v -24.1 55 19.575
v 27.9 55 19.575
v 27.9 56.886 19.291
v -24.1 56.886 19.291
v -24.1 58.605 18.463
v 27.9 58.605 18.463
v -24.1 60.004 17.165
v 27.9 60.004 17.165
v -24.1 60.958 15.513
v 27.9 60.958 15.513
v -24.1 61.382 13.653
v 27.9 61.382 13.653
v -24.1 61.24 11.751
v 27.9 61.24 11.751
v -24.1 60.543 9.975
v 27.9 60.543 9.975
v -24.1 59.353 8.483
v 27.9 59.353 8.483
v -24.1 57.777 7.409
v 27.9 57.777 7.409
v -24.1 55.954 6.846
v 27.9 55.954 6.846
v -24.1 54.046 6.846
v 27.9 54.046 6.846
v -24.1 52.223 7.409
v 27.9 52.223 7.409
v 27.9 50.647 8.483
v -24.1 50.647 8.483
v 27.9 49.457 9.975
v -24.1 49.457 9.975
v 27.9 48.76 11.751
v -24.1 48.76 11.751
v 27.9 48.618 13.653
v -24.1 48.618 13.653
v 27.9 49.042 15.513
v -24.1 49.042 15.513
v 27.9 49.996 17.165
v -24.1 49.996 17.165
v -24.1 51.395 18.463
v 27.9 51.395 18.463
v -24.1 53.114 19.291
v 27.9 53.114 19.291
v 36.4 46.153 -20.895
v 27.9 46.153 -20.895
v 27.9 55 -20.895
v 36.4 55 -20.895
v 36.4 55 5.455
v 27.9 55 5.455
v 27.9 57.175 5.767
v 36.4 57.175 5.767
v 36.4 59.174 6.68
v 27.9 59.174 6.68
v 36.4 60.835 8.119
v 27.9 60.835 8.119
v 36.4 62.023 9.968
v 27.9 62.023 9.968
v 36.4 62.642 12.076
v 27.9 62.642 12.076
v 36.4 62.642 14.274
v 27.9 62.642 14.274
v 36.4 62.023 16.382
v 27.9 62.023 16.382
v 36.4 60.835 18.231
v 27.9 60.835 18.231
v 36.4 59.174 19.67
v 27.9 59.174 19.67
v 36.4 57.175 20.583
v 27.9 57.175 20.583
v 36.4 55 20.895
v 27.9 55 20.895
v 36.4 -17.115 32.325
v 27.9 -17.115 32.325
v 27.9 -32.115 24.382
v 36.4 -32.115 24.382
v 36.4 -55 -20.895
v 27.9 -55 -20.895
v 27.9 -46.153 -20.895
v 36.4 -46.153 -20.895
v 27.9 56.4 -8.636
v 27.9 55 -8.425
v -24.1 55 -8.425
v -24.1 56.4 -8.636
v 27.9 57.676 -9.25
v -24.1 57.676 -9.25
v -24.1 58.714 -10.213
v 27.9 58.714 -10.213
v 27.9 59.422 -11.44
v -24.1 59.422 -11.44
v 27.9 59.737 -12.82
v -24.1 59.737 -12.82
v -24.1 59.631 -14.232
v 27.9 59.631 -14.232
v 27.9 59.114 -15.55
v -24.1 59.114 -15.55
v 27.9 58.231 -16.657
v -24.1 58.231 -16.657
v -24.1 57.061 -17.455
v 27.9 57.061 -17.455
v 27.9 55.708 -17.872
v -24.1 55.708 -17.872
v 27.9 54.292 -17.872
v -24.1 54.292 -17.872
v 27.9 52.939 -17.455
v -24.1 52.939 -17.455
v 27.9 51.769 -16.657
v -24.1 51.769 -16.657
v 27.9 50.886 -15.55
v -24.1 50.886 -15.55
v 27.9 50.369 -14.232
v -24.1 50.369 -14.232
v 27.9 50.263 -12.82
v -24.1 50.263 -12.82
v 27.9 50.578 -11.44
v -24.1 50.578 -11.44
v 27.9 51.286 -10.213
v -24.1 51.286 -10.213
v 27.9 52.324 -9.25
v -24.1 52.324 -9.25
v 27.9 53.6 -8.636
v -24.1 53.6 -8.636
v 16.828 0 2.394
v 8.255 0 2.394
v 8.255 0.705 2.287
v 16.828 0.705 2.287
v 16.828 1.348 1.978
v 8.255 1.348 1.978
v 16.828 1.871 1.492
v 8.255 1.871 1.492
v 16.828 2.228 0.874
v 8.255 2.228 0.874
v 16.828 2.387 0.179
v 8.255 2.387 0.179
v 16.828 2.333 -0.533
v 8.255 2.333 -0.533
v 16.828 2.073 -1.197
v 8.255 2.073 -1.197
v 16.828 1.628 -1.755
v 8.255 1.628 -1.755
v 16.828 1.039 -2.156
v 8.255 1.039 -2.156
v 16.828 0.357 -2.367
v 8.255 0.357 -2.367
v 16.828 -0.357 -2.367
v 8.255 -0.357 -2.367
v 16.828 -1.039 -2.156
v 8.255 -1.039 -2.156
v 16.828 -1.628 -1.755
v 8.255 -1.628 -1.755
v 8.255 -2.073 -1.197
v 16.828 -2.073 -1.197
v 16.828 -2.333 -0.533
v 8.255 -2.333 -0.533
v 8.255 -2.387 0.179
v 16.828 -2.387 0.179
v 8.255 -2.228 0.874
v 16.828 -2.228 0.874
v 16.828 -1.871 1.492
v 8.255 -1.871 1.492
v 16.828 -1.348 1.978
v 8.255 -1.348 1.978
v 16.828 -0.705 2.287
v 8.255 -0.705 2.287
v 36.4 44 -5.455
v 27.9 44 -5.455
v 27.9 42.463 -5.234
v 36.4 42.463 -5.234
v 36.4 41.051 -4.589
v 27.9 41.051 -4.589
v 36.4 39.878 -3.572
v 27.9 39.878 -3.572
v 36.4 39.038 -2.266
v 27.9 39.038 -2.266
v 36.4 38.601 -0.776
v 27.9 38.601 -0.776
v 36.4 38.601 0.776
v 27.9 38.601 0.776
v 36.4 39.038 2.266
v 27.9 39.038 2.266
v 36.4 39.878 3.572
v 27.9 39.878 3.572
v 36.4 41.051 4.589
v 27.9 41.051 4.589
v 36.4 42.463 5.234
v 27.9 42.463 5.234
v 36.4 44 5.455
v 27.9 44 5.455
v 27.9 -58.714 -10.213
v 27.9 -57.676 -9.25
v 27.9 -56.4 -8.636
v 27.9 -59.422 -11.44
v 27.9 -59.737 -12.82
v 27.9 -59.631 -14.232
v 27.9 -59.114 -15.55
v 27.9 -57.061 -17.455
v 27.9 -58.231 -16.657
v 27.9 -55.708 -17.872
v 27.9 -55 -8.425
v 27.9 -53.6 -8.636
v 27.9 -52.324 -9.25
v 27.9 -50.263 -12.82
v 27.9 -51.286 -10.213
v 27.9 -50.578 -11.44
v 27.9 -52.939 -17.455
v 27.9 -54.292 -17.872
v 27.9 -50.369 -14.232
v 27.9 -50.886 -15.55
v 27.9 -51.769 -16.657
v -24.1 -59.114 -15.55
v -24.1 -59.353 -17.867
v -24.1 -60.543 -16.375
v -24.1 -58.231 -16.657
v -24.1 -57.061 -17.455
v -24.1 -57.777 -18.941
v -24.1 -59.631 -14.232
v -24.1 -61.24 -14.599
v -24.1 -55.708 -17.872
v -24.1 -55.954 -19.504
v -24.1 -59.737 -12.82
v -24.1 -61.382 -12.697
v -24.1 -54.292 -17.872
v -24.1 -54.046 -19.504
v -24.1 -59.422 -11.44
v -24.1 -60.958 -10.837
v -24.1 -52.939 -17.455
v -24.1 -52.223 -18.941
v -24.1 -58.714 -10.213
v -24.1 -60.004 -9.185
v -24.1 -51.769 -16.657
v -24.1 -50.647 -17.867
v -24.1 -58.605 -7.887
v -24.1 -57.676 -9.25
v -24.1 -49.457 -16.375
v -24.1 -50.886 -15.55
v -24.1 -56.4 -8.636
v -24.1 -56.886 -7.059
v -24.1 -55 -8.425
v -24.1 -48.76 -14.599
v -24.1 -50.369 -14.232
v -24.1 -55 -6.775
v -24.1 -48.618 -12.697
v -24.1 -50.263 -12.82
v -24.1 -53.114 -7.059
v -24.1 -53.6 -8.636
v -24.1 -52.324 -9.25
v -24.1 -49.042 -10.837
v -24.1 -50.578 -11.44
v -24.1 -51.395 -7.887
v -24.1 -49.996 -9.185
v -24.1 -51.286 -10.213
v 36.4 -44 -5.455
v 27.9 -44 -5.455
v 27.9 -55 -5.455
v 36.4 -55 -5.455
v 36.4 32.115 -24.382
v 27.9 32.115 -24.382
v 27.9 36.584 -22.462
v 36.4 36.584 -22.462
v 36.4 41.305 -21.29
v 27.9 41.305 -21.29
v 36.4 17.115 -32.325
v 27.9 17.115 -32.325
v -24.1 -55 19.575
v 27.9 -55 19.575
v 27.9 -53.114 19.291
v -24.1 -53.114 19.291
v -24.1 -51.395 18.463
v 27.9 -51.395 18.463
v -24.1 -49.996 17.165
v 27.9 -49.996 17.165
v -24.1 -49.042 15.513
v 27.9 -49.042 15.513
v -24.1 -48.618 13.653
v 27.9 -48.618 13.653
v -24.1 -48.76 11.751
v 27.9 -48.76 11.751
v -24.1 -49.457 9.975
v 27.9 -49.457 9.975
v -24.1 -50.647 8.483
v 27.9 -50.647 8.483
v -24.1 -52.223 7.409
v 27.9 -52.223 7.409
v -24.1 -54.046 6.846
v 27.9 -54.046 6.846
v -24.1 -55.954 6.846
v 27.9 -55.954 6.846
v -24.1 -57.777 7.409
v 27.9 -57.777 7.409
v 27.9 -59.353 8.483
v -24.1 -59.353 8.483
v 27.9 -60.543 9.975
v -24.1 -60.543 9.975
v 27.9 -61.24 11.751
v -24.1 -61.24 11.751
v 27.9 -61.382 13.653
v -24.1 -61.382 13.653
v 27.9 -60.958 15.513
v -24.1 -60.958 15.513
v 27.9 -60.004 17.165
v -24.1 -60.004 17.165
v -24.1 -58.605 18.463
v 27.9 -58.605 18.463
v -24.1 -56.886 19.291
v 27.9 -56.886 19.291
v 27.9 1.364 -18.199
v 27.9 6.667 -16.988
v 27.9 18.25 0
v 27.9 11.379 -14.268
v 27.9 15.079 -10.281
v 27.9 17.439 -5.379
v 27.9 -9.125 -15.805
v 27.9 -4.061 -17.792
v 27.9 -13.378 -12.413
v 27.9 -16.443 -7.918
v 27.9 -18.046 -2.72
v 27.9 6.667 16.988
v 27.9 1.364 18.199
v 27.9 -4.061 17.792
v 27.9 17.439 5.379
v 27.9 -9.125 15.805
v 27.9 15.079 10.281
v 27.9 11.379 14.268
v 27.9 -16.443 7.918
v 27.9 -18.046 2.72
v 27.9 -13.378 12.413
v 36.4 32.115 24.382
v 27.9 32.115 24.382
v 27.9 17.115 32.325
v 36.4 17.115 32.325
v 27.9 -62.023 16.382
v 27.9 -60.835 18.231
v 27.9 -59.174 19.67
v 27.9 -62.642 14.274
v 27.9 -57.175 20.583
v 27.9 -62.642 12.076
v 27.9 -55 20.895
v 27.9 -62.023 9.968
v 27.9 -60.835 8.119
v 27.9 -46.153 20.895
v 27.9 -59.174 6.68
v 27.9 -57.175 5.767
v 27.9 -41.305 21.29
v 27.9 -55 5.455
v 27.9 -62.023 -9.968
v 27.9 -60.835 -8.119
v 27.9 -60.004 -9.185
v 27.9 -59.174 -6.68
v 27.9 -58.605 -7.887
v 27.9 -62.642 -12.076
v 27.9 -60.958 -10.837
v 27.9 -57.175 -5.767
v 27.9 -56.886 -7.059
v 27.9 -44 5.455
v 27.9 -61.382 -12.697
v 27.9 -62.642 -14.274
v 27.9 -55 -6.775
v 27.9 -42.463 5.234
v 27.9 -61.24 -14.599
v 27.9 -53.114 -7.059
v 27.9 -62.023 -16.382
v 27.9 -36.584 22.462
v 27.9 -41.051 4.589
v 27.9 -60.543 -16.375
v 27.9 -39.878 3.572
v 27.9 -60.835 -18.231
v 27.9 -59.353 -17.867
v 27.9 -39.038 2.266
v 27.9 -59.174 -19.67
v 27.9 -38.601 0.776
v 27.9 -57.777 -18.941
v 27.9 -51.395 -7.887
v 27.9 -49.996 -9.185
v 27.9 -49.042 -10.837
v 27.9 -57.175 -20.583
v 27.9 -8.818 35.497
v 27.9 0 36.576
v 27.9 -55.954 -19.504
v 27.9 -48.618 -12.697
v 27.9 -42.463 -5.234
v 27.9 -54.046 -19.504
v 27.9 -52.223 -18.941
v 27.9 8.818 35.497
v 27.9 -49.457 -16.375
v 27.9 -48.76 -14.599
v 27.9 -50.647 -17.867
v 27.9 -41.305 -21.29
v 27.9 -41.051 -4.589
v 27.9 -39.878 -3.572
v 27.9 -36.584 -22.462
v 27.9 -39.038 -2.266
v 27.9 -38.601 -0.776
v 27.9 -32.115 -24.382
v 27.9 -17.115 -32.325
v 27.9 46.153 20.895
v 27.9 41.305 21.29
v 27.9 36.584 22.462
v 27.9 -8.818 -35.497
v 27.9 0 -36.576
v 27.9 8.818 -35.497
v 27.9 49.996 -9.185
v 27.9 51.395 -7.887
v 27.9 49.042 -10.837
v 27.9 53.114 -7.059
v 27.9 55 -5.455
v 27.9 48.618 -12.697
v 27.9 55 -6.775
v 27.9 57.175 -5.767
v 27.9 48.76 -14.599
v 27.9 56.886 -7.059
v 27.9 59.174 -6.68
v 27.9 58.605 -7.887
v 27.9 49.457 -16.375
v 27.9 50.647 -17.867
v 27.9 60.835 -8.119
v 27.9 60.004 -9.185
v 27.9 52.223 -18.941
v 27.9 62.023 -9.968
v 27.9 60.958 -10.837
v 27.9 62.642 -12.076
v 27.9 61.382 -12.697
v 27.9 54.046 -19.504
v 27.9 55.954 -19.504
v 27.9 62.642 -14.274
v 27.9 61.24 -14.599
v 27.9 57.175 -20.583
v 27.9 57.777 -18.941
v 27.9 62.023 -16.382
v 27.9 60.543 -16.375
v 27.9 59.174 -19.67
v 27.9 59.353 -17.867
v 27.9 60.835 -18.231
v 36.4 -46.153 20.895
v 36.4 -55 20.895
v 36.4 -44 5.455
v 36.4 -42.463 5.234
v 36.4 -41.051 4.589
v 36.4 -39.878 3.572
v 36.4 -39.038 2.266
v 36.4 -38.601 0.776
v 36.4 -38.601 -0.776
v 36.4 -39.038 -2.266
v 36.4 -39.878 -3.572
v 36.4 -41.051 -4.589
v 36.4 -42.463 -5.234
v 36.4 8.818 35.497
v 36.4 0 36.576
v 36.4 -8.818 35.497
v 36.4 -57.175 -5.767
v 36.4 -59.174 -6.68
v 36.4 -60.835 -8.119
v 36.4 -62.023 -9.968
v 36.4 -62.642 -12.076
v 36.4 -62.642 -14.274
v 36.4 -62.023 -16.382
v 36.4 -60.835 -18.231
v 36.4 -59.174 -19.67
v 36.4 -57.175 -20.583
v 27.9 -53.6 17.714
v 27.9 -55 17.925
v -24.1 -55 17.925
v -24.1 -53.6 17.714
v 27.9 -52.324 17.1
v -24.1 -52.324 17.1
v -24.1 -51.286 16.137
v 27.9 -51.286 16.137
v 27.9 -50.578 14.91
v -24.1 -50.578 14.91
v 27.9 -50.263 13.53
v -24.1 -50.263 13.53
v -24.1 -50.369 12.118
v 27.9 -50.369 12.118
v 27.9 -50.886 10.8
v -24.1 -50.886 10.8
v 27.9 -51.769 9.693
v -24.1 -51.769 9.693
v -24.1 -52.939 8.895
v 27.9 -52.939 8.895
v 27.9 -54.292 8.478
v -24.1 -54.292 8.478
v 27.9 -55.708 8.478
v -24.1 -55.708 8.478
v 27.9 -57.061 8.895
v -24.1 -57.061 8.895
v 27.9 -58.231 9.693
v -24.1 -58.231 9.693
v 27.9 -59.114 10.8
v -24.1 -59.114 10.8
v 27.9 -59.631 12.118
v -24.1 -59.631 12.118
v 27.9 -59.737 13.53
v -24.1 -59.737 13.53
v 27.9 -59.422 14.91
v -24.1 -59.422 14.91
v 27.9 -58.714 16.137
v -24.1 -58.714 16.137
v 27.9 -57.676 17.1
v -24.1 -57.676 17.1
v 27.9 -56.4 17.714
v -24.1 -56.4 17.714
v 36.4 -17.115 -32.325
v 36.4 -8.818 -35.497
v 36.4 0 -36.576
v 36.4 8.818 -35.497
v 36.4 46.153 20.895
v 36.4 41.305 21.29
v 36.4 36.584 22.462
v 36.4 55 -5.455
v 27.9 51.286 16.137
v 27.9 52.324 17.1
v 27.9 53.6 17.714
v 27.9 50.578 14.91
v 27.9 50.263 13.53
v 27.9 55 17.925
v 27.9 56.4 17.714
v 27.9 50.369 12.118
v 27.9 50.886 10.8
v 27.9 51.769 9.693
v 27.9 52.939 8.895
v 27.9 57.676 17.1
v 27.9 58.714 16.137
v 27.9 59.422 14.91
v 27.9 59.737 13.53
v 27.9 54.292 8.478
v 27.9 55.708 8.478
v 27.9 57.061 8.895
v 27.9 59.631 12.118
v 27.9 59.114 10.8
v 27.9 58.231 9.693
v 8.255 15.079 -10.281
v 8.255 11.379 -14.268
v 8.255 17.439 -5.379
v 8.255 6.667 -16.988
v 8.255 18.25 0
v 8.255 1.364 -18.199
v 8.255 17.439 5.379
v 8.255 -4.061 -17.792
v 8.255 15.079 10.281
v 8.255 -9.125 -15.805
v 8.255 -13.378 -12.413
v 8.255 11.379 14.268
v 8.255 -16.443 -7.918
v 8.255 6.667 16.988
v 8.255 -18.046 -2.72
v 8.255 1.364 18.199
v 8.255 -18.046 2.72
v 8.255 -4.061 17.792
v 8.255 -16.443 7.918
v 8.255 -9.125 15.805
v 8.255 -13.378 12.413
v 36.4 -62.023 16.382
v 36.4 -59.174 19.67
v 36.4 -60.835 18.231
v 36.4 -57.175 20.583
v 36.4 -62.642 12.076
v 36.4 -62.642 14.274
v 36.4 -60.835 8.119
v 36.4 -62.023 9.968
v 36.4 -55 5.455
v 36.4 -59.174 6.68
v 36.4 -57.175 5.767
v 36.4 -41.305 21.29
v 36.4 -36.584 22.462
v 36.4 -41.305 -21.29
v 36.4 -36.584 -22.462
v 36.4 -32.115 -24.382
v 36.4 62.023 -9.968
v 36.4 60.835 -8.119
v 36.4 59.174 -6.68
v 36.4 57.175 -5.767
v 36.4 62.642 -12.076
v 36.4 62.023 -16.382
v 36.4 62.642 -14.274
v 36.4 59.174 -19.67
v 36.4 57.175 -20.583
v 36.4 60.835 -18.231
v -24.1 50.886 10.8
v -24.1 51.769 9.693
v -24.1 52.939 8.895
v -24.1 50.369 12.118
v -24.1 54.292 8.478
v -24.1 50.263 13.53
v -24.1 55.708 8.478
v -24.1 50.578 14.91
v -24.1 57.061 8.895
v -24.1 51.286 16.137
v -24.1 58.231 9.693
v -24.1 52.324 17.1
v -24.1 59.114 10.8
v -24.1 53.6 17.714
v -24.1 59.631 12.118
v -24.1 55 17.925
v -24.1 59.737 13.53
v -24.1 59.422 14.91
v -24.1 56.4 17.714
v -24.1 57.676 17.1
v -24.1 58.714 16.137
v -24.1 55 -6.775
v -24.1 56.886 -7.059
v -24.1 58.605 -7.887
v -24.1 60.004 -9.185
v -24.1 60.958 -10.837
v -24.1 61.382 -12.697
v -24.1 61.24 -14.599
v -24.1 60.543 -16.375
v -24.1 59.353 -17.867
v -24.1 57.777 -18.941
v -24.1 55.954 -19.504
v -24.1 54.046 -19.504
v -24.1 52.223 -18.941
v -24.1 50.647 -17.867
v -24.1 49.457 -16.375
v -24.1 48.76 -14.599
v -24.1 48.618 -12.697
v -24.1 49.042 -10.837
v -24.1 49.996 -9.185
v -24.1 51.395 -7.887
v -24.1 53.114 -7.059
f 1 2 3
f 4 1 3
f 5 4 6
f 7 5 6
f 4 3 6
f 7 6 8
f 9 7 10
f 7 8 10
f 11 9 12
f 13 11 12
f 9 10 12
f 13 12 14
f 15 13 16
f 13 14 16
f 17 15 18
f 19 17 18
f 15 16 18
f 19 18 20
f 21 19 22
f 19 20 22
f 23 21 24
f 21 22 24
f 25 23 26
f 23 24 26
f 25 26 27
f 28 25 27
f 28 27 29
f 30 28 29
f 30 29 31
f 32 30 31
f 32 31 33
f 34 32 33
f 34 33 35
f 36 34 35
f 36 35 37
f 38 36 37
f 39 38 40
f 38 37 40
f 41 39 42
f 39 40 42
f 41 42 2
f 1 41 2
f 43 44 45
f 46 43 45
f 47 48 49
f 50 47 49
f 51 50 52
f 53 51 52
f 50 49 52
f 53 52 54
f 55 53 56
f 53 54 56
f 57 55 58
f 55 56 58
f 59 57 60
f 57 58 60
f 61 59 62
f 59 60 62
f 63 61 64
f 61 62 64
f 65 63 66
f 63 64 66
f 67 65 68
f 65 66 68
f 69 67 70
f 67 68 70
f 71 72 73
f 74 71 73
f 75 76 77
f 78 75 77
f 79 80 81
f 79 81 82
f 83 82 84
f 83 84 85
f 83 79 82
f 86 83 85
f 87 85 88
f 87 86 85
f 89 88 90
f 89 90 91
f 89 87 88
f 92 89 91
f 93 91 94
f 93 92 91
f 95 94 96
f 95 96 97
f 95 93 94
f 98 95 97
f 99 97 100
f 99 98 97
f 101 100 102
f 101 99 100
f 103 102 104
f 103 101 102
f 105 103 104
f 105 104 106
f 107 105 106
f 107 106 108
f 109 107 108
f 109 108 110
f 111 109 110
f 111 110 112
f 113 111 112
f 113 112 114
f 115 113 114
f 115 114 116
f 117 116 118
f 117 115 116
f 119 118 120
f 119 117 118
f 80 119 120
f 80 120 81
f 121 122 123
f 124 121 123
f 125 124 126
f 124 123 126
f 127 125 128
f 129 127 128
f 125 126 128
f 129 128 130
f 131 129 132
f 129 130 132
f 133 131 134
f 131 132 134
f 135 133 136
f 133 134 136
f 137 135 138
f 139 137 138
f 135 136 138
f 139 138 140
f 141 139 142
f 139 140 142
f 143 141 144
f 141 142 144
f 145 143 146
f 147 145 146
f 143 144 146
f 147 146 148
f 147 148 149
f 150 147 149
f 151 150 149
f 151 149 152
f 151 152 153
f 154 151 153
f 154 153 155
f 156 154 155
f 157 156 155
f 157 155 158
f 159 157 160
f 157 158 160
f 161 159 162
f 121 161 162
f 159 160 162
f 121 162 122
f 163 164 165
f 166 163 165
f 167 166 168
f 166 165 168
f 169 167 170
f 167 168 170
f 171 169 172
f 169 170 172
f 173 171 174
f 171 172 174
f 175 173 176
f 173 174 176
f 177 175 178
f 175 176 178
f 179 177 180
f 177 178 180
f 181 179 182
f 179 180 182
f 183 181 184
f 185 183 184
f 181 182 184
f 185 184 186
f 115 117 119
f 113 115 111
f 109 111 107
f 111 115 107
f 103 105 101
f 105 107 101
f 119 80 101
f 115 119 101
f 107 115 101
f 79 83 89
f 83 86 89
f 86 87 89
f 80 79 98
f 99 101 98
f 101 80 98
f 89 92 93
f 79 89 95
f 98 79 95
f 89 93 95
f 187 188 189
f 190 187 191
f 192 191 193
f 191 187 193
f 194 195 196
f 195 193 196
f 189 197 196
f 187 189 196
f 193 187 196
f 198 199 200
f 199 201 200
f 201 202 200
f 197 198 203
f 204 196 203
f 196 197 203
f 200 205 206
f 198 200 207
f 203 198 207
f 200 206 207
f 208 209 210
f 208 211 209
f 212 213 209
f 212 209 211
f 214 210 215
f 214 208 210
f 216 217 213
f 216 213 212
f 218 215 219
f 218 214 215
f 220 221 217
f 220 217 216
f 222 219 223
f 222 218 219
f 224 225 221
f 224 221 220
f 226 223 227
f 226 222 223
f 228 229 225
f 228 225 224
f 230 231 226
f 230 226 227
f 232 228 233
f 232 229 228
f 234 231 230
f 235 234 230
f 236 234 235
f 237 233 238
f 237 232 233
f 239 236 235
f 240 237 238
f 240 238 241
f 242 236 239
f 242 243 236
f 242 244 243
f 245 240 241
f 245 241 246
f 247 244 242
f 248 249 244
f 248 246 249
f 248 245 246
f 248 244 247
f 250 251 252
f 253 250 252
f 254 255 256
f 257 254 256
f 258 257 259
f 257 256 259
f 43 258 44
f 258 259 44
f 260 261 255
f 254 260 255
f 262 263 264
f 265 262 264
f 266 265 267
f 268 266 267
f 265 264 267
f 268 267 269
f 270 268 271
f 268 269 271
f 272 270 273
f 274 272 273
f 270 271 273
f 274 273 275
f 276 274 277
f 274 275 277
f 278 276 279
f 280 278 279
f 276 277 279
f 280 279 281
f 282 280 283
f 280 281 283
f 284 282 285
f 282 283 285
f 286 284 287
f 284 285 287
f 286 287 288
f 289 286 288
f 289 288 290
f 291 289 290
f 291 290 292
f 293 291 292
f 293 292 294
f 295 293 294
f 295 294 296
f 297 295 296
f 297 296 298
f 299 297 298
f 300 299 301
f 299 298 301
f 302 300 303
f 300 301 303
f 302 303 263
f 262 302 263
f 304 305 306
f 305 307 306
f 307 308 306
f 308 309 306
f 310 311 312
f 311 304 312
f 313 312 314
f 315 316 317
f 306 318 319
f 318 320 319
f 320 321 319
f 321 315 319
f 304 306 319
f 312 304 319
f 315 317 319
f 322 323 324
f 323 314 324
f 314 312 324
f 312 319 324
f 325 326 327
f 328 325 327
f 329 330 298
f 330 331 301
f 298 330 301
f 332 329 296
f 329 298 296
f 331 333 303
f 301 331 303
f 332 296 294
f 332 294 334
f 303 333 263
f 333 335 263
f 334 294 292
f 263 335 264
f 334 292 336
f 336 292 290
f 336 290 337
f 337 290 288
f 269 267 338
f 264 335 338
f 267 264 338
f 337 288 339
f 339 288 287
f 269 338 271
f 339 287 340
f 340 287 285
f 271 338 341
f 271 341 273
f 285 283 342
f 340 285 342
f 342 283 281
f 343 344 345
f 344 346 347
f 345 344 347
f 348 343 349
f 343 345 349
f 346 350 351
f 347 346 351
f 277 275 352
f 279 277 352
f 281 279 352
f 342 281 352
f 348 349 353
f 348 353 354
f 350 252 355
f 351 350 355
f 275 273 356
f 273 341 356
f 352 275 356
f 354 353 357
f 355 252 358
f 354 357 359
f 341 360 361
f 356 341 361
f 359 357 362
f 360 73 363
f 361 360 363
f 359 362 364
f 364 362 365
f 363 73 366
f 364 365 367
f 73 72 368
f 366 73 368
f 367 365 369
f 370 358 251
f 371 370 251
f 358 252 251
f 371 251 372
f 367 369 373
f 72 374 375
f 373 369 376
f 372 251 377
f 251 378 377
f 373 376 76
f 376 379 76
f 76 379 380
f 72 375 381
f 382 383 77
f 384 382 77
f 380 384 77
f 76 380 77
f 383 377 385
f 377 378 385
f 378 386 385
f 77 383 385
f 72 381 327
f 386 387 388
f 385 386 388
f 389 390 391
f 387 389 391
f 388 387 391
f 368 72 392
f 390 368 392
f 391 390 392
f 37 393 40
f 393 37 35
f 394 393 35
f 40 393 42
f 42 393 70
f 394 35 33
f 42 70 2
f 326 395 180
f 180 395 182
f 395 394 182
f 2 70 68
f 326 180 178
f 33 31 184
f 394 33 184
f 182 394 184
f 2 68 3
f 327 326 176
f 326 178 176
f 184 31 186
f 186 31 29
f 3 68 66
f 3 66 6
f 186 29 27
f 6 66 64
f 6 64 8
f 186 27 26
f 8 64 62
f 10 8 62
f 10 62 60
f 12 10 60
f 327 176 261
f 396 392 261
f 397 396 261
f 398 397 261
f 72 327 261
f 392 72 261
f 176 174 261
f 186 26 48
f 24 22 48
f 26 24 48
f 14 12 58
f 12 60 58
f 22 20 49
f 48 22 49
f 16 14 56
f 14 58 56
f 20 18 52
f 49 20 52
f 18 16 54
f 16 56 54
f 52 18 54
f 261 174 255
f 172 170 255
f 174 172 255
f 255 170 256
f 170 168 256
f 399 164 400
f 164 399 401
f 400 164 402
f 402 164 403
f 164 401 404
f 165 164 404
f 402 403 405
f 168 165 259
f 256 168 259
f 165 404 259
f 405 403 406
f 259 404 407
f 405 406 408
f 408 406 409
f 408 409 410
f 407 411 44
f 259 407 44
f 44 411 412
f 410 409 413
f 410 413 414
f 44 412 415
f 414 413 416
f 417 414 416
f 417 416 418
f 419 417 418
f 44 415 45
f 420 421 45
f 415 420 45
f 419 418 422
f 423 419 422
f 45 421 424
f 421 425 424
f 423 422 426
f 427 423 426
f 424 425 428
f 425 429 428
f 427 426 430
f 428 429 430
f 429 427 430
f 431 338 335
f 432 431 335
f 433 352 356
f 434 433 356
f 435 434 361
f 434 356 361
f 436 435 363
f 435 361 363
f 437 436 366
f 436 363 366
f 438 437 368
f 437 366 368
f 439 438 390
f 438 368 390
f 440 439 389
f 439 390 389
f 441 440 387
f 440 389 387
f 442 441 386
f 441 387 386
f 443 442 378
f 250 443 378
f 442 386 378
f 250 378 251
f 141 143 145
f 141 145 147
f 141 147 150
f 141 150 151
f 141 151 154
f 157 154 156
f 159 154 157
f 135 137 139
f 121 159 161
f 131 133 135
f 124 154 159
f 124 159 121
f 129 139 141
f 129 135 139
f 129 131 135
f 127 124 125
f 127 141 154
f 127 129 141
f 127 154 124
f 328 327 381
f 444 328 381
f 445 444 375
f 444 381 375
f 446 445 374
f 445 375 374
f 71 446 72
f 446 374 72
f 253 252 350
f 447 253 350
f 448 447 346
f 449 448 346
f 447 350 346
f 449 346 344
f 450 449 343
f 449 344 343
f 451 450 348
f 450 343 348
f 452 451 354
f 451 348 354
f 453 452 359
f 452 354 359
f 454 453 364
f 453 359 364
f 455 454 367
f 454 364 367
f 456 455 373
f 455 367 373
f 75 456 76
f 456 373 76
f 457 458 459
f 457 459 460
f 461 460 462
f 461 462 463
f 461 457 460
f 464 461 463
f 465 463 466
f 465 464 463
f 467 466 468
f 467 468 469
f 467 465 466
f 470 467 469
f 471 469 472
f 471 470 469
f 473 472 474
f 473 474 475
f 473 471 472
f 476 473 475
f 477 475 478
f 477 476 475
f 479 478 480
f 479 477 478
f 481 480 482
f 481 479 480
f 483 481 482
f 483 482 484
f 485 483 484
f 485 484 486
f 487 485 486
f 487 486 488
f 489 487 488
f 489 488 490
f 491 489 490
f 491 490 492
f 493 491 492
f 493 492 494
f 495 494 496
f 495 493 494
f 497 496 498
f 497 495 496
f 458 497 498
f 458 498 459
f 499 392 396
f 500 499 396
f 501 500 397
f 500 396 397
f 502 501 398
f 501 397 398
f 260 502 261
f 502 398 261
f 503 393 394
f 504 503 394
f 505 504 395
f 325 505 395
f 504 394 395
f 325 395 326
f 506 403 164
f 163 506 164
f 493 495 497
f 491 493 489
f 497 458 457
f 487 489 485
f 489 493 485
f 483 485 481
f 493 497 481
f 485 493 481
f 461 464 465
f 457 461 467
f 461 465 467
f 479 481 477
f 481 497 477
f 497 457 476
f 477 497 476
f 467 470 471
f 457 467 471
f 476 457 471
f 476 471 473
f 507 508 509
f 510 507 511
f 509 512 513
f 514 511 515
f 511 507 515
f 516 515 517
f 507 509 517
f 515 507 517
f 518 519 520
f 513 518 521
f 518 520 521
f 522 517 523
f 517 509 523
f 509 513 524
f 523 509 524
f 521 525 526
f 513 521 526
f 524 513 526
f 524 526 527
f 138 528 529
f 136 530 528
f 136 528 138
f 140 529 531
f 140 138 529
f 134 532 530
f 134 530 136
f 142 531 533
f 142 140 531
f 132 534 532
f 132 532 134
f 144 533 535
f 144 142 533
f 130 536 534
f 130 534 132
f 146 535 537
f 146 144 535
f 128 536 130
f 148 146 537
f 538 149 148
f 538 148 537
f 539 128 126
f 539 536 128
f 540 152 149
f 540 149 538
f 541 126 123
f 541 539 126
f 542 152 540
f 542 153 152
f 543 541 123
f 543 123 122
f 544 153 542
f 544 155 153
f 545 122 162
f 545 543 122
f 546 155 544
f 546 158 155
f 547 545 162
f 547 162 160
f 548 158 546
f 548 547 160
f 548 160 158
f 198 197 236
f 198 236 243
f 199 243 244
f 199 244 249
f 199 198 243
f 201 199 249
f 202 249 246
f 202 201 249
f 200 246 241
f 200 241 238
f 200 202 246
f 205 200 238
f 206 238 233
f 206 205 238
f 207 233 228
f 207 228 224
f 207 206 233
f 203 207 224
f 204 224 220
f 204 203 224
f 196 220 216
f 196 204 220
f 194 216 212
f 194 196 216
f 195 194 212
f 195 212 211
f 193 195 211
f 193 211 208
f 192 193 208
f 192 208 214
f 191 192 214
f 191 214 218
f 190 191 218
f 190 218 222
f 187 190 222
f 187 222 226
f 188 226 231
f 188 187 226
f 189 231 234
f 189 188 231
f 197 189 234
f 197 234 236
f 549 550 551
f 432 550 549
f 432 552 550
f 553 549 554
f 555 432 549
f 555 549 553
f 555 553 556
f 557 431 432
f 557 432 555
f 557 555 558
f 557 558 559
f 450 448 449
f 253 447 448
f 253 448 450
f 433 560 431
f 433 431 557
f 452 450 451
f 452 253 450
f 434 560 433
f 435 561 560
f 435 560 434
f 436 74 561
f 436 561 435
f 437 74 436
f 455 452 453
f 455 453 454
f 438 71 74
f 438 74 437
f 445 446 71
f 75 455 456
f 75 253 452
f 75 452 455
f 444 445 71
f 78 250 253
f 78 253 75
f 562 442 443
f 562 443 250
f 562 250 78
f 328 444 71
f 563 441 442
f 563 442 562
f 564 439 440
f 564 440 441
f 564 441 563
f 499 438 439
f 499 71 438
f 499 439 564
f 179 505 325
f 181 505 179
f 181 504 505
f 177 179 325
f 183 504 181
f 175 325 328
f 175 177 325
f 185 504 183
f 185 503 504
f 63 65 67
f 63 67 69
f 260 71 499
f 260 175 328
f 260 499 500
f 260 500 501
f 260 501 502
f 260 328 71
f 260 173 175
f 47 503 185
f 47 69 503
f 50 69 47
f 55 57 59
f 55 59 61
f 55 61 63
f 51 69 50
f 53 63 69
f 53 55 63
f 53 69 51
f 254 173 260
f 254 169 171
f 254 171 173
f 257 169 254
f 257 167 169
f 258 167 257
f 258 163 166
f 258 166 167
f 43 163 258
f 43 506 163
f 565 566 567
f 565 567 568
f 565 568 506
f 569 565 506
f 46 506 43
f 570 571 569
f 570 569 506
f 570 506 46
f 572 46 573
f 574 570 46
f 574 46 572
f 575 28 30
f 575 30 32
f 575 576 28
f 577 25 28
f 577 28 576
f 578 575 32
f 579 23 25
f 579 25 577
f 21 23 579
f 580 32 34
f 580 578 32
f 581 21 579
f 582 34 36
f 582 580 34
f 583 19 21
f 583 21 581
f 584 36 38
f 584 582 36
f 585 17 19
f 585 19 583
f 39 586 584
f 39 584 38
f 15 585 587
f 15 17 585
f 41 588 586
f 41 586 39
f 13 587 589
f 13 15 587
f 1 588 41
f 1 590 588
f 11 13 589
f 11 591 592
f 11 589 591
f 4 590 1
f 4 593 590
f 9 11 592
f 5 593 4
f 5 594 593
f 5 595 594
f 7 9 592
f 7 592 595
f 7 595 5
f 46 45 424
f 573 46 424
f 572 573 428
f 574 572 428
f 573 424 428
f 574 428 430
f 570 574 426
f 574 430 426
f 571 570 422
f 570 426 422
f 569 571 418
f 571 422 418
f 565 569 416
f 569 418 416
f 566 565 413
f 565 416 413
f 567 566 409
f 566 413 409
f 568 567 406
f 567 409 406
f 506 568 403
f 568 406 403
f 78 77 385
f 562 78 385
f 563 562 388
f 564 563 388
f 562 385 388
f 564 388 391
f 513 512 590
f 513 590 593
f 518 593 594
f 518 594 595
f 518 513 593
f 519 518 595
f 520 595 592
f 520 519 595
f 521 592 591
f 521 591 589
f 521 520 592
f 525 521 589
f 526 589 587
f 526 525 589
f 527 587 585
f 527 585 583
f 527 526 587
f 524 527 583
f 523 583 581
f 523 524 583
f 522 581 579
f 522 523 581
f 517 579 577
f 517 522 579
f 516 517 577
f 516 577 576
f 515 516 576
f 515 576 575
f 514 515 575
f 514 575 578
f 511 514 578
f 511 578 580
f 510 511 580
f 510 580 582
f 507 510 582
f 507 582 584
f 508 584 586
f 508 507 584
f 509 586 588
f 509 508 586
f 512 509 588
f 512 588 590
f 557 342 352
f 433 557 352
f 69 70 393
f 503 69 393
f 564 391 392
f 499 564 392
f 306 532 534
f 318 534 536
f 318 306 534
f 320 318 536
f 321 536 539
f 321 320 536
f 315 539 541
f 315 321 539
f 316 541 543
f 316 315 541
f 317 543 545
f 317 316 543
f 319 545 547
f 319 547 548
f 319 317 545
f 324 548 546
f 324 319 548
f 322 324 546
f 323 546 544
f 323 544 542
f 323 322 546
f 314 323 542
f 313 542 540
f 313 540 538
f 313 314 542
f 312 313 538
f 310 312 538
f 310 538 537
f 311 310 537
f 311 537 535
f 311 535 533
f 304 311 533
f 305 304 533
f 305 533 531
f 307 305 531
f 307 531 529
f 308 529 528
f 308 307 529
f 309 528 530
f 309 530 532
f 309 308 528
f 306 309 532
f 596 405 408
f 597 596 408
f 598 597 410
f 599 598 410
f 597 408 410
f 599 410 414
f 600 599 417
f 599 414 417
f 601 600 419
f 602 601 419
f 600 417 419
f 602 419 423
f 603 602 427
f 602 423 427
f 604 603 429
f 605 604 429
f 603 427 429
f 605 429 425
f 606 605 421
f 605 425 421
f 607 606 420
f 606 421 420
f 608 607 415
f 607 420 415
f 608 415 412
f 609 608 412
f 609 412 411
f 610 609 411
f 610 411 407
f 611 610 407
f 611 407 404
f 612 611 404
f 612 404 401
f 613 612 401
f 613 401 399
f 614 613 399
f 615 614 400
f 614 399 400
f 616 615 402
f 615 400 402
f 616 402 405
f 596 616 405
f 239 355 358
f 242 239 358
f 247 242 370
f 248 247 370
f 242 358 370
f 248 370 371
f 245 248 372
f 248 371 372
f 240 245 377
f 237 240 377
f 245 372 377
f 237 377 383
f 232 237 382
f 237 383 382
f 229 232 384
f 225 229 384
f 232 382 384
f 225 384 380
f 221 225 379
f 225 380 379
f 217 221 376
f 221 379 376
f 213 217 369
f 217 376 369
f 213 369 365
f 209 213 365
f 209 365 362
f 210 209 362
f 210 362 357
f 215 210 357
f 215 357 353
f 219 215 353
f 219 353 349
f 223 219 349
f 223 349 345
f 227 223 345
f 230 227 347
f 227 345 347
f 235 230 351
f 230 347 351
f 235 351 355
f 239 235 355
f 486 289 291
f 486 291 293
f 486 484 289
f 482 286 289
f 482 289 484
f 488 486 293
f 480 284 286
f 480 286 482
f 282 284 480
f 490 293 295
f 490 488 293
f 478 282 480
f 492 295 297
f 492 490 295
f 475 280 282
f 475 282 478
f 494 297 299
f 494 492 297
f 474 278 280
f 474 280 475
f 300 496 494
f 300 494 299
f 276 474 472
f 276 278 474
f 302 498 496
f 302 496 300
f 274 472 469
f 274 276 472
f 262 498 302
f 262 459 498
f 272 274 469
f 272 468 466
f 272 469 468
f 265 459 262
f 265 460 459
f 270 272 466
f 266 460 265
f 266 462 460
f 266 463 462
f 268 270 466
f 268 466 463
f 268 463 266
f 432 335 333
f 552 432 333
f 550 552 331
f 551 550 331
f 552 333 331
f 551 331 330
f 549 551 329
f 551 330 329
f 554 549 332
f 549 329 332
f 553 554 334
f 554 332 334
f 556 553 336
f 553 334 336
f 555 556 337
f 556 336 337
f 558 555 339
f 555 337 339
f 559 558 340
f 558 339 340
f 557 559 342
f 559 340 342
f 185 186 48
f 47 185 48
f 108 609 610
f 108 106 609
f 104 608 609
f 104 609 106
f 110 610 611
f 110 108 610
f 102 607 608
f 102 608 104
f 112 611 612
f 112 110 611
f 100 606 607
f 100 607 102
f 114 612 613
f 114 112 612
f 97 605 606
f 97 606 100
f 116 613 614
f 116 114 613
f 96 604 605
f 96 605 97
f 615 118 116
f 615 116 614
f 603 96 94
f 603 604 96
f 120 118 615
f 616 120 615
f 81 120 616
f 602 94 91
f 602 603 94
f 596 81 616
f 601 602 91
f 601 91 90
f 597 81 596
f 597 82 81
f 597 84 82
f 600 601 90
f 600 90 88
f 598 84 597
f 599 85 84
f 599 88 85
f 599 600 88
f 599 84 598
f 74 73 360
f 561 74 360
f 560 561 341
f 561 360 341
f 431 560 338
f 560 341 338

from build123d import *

# Parameters (mm, degrees)
SKETCH1_W           = 19.645
SKETCH1_H           = 18.25
SKETCH2_R           = 2.3935
CUT_EXTRUDE1_DEPTH  = 8.5725
SKETCH3_R           = 18.25
BOSS_EXTRUDE1_DEPTH = 8.5
SKETCH4_R           = 6.4
SKETCH4_R_2         = 4.75
BOSS_EXTRUDE2_DEPTH = 52


with BuildPart() as part:
    # Sketch1 → Revolve1 (revolve)
    with BuildSketch(Plane.XY):
        with Locations((18.0775, 9.125)):
            Rectangle(SKETCH1_W, SKETCH1_H)
    revolve(axis=Axis((8.255, 0, 0), (1, 0, 0)))

    # Sketch2 → Cut-Extrude1 (cut)
    with BuildSketch(Plane.ZY.offset(-8.255)):
        Circle(SKETCH2_R)
    extrude(amount=-CUT_EXTRUDE1_DEPTH, mode=Mode.SUBTRACT)


with BuildPart() as body_2:
    # Sketch3 → Boss-Extrude1 (new body)
    with BuildSketch(Plane(origin=(27.9, 0, 0), x_dir=(0, 0, -1), z_dir=(1, 0, 0))):
        with BuildLine():
            Line((-24.382347836, 32.115154563), (-32.324530318, 17.115154563))
            ThreePointArc((-32.324530318, 17.115154563), (-36.576, 0), (-32.324530318, -17.115154563))
            Line((-32.324530318, -17.115154563), (-24.382347836, -32.115154563))
            ThreePointArc((-24.382347836, -32.115154563), (-21.780072988, -38.920854003), (-20.89525, -46.153175037))
            Line((-20.89525, -46.153175037), (-20.89525, -55))
            ThreePointArc((-20.89525, -55), (-13.175, -62.72025), (-5.45475, -55))
            Line((-5.45475, -55), (-5.45475, -44))
            ThreePointArc((-5.45475, -44), (0, -38.54525), (5.45475, -44))
            Line((5.45475, -44), (5.45475, -55))
            ThreePointArc((5.45475, -55), (13.175, -62.72025), (20.89525, -55))
            Line((20.89525, -55), (20.89525, -46.153175037))
            ThreePointArc((20.89525, -46.153175037), (21.780072988, -38.920854003), (24.382347836, -32.115154563))
            Line((24.382347836, -32.115154563), (32.324530318, -17.115154563))
            ThreePointArc((32.324530318, -17.115154563), (36.576, 0), (32.324530318, 17.115154563))
            Line((32.324530318, 17.115154563), (24.382347836, 32.115154563))
            ThreePointArc((24.382347836, 32.115154563), (21.780072988, 38.920854003), (20.89525, 46.153175037))
            Line((20.89525, 46.153175037), (20.89525, 55))
            ThreePointArc((20.89525, 55), (13.175, 62.72025), (5.45475, 55))
            Line((5.45475, 55), (5.45475, 44))
            ThreePointArc((5.45475, 44), (0, 38.54525), (-5.45475, 44))
            Line((-5.45475, 44), (-5.45475, 55))
            ThreePointArc((-5.45475, 55), (-13.175, 62.72025), (-20.89525, 55))
            Line((-20.89525, 55), (-20.89525, 46.153175037))
            ThreePointArc((-20.89525, 46.153175037), (-21.780072988, 38.920854003), (-24.382347836, 32.115154563))
        make_face()
        Circle(SKETCH3_R, mode=Mode.SUBTRACT)
        Circle(SKETCH3_R)
    extrude(amount=BOSS_EXTRUDE1_DEPTH)

    # Sketch4 → Boss-Extrude2 (add)
    with BuildSketch(Plane.ZY.offset(-27.9)):
        with Locations((-13.175, 55)):
            Circle(SKETCH4_R)
        with Locations((-13.175, 55)):
            Circle(SKETCH4_R_2, mode=Mode.SUBTRACT)
        with Locations((13.175, 55)):
            Circle(SKETCH4_R)
        with Locations((13.175, 55)):
            Circle(SKETCH4_R_2, mode=Mode.SUBTRACT)
        with Locations((13.175, -55)):
            Circle(SKETCH4_R)
        with Locations((13.175, -55)):
            Circle(SKETCH4_R_2, mode=Mode.SUBTRACT)
        with Locations((-13.175, -55)):
            Circle(SKETCH4_R)
        with Locations((-13.175, -55)):
            Circle(SKETCH4_R_2, mode=Mode.SUBTRACT)
    extrude(amount=BOSS_EXTRUDE2_DEPTH)


solid = Compound([part.part, body_2.part])
